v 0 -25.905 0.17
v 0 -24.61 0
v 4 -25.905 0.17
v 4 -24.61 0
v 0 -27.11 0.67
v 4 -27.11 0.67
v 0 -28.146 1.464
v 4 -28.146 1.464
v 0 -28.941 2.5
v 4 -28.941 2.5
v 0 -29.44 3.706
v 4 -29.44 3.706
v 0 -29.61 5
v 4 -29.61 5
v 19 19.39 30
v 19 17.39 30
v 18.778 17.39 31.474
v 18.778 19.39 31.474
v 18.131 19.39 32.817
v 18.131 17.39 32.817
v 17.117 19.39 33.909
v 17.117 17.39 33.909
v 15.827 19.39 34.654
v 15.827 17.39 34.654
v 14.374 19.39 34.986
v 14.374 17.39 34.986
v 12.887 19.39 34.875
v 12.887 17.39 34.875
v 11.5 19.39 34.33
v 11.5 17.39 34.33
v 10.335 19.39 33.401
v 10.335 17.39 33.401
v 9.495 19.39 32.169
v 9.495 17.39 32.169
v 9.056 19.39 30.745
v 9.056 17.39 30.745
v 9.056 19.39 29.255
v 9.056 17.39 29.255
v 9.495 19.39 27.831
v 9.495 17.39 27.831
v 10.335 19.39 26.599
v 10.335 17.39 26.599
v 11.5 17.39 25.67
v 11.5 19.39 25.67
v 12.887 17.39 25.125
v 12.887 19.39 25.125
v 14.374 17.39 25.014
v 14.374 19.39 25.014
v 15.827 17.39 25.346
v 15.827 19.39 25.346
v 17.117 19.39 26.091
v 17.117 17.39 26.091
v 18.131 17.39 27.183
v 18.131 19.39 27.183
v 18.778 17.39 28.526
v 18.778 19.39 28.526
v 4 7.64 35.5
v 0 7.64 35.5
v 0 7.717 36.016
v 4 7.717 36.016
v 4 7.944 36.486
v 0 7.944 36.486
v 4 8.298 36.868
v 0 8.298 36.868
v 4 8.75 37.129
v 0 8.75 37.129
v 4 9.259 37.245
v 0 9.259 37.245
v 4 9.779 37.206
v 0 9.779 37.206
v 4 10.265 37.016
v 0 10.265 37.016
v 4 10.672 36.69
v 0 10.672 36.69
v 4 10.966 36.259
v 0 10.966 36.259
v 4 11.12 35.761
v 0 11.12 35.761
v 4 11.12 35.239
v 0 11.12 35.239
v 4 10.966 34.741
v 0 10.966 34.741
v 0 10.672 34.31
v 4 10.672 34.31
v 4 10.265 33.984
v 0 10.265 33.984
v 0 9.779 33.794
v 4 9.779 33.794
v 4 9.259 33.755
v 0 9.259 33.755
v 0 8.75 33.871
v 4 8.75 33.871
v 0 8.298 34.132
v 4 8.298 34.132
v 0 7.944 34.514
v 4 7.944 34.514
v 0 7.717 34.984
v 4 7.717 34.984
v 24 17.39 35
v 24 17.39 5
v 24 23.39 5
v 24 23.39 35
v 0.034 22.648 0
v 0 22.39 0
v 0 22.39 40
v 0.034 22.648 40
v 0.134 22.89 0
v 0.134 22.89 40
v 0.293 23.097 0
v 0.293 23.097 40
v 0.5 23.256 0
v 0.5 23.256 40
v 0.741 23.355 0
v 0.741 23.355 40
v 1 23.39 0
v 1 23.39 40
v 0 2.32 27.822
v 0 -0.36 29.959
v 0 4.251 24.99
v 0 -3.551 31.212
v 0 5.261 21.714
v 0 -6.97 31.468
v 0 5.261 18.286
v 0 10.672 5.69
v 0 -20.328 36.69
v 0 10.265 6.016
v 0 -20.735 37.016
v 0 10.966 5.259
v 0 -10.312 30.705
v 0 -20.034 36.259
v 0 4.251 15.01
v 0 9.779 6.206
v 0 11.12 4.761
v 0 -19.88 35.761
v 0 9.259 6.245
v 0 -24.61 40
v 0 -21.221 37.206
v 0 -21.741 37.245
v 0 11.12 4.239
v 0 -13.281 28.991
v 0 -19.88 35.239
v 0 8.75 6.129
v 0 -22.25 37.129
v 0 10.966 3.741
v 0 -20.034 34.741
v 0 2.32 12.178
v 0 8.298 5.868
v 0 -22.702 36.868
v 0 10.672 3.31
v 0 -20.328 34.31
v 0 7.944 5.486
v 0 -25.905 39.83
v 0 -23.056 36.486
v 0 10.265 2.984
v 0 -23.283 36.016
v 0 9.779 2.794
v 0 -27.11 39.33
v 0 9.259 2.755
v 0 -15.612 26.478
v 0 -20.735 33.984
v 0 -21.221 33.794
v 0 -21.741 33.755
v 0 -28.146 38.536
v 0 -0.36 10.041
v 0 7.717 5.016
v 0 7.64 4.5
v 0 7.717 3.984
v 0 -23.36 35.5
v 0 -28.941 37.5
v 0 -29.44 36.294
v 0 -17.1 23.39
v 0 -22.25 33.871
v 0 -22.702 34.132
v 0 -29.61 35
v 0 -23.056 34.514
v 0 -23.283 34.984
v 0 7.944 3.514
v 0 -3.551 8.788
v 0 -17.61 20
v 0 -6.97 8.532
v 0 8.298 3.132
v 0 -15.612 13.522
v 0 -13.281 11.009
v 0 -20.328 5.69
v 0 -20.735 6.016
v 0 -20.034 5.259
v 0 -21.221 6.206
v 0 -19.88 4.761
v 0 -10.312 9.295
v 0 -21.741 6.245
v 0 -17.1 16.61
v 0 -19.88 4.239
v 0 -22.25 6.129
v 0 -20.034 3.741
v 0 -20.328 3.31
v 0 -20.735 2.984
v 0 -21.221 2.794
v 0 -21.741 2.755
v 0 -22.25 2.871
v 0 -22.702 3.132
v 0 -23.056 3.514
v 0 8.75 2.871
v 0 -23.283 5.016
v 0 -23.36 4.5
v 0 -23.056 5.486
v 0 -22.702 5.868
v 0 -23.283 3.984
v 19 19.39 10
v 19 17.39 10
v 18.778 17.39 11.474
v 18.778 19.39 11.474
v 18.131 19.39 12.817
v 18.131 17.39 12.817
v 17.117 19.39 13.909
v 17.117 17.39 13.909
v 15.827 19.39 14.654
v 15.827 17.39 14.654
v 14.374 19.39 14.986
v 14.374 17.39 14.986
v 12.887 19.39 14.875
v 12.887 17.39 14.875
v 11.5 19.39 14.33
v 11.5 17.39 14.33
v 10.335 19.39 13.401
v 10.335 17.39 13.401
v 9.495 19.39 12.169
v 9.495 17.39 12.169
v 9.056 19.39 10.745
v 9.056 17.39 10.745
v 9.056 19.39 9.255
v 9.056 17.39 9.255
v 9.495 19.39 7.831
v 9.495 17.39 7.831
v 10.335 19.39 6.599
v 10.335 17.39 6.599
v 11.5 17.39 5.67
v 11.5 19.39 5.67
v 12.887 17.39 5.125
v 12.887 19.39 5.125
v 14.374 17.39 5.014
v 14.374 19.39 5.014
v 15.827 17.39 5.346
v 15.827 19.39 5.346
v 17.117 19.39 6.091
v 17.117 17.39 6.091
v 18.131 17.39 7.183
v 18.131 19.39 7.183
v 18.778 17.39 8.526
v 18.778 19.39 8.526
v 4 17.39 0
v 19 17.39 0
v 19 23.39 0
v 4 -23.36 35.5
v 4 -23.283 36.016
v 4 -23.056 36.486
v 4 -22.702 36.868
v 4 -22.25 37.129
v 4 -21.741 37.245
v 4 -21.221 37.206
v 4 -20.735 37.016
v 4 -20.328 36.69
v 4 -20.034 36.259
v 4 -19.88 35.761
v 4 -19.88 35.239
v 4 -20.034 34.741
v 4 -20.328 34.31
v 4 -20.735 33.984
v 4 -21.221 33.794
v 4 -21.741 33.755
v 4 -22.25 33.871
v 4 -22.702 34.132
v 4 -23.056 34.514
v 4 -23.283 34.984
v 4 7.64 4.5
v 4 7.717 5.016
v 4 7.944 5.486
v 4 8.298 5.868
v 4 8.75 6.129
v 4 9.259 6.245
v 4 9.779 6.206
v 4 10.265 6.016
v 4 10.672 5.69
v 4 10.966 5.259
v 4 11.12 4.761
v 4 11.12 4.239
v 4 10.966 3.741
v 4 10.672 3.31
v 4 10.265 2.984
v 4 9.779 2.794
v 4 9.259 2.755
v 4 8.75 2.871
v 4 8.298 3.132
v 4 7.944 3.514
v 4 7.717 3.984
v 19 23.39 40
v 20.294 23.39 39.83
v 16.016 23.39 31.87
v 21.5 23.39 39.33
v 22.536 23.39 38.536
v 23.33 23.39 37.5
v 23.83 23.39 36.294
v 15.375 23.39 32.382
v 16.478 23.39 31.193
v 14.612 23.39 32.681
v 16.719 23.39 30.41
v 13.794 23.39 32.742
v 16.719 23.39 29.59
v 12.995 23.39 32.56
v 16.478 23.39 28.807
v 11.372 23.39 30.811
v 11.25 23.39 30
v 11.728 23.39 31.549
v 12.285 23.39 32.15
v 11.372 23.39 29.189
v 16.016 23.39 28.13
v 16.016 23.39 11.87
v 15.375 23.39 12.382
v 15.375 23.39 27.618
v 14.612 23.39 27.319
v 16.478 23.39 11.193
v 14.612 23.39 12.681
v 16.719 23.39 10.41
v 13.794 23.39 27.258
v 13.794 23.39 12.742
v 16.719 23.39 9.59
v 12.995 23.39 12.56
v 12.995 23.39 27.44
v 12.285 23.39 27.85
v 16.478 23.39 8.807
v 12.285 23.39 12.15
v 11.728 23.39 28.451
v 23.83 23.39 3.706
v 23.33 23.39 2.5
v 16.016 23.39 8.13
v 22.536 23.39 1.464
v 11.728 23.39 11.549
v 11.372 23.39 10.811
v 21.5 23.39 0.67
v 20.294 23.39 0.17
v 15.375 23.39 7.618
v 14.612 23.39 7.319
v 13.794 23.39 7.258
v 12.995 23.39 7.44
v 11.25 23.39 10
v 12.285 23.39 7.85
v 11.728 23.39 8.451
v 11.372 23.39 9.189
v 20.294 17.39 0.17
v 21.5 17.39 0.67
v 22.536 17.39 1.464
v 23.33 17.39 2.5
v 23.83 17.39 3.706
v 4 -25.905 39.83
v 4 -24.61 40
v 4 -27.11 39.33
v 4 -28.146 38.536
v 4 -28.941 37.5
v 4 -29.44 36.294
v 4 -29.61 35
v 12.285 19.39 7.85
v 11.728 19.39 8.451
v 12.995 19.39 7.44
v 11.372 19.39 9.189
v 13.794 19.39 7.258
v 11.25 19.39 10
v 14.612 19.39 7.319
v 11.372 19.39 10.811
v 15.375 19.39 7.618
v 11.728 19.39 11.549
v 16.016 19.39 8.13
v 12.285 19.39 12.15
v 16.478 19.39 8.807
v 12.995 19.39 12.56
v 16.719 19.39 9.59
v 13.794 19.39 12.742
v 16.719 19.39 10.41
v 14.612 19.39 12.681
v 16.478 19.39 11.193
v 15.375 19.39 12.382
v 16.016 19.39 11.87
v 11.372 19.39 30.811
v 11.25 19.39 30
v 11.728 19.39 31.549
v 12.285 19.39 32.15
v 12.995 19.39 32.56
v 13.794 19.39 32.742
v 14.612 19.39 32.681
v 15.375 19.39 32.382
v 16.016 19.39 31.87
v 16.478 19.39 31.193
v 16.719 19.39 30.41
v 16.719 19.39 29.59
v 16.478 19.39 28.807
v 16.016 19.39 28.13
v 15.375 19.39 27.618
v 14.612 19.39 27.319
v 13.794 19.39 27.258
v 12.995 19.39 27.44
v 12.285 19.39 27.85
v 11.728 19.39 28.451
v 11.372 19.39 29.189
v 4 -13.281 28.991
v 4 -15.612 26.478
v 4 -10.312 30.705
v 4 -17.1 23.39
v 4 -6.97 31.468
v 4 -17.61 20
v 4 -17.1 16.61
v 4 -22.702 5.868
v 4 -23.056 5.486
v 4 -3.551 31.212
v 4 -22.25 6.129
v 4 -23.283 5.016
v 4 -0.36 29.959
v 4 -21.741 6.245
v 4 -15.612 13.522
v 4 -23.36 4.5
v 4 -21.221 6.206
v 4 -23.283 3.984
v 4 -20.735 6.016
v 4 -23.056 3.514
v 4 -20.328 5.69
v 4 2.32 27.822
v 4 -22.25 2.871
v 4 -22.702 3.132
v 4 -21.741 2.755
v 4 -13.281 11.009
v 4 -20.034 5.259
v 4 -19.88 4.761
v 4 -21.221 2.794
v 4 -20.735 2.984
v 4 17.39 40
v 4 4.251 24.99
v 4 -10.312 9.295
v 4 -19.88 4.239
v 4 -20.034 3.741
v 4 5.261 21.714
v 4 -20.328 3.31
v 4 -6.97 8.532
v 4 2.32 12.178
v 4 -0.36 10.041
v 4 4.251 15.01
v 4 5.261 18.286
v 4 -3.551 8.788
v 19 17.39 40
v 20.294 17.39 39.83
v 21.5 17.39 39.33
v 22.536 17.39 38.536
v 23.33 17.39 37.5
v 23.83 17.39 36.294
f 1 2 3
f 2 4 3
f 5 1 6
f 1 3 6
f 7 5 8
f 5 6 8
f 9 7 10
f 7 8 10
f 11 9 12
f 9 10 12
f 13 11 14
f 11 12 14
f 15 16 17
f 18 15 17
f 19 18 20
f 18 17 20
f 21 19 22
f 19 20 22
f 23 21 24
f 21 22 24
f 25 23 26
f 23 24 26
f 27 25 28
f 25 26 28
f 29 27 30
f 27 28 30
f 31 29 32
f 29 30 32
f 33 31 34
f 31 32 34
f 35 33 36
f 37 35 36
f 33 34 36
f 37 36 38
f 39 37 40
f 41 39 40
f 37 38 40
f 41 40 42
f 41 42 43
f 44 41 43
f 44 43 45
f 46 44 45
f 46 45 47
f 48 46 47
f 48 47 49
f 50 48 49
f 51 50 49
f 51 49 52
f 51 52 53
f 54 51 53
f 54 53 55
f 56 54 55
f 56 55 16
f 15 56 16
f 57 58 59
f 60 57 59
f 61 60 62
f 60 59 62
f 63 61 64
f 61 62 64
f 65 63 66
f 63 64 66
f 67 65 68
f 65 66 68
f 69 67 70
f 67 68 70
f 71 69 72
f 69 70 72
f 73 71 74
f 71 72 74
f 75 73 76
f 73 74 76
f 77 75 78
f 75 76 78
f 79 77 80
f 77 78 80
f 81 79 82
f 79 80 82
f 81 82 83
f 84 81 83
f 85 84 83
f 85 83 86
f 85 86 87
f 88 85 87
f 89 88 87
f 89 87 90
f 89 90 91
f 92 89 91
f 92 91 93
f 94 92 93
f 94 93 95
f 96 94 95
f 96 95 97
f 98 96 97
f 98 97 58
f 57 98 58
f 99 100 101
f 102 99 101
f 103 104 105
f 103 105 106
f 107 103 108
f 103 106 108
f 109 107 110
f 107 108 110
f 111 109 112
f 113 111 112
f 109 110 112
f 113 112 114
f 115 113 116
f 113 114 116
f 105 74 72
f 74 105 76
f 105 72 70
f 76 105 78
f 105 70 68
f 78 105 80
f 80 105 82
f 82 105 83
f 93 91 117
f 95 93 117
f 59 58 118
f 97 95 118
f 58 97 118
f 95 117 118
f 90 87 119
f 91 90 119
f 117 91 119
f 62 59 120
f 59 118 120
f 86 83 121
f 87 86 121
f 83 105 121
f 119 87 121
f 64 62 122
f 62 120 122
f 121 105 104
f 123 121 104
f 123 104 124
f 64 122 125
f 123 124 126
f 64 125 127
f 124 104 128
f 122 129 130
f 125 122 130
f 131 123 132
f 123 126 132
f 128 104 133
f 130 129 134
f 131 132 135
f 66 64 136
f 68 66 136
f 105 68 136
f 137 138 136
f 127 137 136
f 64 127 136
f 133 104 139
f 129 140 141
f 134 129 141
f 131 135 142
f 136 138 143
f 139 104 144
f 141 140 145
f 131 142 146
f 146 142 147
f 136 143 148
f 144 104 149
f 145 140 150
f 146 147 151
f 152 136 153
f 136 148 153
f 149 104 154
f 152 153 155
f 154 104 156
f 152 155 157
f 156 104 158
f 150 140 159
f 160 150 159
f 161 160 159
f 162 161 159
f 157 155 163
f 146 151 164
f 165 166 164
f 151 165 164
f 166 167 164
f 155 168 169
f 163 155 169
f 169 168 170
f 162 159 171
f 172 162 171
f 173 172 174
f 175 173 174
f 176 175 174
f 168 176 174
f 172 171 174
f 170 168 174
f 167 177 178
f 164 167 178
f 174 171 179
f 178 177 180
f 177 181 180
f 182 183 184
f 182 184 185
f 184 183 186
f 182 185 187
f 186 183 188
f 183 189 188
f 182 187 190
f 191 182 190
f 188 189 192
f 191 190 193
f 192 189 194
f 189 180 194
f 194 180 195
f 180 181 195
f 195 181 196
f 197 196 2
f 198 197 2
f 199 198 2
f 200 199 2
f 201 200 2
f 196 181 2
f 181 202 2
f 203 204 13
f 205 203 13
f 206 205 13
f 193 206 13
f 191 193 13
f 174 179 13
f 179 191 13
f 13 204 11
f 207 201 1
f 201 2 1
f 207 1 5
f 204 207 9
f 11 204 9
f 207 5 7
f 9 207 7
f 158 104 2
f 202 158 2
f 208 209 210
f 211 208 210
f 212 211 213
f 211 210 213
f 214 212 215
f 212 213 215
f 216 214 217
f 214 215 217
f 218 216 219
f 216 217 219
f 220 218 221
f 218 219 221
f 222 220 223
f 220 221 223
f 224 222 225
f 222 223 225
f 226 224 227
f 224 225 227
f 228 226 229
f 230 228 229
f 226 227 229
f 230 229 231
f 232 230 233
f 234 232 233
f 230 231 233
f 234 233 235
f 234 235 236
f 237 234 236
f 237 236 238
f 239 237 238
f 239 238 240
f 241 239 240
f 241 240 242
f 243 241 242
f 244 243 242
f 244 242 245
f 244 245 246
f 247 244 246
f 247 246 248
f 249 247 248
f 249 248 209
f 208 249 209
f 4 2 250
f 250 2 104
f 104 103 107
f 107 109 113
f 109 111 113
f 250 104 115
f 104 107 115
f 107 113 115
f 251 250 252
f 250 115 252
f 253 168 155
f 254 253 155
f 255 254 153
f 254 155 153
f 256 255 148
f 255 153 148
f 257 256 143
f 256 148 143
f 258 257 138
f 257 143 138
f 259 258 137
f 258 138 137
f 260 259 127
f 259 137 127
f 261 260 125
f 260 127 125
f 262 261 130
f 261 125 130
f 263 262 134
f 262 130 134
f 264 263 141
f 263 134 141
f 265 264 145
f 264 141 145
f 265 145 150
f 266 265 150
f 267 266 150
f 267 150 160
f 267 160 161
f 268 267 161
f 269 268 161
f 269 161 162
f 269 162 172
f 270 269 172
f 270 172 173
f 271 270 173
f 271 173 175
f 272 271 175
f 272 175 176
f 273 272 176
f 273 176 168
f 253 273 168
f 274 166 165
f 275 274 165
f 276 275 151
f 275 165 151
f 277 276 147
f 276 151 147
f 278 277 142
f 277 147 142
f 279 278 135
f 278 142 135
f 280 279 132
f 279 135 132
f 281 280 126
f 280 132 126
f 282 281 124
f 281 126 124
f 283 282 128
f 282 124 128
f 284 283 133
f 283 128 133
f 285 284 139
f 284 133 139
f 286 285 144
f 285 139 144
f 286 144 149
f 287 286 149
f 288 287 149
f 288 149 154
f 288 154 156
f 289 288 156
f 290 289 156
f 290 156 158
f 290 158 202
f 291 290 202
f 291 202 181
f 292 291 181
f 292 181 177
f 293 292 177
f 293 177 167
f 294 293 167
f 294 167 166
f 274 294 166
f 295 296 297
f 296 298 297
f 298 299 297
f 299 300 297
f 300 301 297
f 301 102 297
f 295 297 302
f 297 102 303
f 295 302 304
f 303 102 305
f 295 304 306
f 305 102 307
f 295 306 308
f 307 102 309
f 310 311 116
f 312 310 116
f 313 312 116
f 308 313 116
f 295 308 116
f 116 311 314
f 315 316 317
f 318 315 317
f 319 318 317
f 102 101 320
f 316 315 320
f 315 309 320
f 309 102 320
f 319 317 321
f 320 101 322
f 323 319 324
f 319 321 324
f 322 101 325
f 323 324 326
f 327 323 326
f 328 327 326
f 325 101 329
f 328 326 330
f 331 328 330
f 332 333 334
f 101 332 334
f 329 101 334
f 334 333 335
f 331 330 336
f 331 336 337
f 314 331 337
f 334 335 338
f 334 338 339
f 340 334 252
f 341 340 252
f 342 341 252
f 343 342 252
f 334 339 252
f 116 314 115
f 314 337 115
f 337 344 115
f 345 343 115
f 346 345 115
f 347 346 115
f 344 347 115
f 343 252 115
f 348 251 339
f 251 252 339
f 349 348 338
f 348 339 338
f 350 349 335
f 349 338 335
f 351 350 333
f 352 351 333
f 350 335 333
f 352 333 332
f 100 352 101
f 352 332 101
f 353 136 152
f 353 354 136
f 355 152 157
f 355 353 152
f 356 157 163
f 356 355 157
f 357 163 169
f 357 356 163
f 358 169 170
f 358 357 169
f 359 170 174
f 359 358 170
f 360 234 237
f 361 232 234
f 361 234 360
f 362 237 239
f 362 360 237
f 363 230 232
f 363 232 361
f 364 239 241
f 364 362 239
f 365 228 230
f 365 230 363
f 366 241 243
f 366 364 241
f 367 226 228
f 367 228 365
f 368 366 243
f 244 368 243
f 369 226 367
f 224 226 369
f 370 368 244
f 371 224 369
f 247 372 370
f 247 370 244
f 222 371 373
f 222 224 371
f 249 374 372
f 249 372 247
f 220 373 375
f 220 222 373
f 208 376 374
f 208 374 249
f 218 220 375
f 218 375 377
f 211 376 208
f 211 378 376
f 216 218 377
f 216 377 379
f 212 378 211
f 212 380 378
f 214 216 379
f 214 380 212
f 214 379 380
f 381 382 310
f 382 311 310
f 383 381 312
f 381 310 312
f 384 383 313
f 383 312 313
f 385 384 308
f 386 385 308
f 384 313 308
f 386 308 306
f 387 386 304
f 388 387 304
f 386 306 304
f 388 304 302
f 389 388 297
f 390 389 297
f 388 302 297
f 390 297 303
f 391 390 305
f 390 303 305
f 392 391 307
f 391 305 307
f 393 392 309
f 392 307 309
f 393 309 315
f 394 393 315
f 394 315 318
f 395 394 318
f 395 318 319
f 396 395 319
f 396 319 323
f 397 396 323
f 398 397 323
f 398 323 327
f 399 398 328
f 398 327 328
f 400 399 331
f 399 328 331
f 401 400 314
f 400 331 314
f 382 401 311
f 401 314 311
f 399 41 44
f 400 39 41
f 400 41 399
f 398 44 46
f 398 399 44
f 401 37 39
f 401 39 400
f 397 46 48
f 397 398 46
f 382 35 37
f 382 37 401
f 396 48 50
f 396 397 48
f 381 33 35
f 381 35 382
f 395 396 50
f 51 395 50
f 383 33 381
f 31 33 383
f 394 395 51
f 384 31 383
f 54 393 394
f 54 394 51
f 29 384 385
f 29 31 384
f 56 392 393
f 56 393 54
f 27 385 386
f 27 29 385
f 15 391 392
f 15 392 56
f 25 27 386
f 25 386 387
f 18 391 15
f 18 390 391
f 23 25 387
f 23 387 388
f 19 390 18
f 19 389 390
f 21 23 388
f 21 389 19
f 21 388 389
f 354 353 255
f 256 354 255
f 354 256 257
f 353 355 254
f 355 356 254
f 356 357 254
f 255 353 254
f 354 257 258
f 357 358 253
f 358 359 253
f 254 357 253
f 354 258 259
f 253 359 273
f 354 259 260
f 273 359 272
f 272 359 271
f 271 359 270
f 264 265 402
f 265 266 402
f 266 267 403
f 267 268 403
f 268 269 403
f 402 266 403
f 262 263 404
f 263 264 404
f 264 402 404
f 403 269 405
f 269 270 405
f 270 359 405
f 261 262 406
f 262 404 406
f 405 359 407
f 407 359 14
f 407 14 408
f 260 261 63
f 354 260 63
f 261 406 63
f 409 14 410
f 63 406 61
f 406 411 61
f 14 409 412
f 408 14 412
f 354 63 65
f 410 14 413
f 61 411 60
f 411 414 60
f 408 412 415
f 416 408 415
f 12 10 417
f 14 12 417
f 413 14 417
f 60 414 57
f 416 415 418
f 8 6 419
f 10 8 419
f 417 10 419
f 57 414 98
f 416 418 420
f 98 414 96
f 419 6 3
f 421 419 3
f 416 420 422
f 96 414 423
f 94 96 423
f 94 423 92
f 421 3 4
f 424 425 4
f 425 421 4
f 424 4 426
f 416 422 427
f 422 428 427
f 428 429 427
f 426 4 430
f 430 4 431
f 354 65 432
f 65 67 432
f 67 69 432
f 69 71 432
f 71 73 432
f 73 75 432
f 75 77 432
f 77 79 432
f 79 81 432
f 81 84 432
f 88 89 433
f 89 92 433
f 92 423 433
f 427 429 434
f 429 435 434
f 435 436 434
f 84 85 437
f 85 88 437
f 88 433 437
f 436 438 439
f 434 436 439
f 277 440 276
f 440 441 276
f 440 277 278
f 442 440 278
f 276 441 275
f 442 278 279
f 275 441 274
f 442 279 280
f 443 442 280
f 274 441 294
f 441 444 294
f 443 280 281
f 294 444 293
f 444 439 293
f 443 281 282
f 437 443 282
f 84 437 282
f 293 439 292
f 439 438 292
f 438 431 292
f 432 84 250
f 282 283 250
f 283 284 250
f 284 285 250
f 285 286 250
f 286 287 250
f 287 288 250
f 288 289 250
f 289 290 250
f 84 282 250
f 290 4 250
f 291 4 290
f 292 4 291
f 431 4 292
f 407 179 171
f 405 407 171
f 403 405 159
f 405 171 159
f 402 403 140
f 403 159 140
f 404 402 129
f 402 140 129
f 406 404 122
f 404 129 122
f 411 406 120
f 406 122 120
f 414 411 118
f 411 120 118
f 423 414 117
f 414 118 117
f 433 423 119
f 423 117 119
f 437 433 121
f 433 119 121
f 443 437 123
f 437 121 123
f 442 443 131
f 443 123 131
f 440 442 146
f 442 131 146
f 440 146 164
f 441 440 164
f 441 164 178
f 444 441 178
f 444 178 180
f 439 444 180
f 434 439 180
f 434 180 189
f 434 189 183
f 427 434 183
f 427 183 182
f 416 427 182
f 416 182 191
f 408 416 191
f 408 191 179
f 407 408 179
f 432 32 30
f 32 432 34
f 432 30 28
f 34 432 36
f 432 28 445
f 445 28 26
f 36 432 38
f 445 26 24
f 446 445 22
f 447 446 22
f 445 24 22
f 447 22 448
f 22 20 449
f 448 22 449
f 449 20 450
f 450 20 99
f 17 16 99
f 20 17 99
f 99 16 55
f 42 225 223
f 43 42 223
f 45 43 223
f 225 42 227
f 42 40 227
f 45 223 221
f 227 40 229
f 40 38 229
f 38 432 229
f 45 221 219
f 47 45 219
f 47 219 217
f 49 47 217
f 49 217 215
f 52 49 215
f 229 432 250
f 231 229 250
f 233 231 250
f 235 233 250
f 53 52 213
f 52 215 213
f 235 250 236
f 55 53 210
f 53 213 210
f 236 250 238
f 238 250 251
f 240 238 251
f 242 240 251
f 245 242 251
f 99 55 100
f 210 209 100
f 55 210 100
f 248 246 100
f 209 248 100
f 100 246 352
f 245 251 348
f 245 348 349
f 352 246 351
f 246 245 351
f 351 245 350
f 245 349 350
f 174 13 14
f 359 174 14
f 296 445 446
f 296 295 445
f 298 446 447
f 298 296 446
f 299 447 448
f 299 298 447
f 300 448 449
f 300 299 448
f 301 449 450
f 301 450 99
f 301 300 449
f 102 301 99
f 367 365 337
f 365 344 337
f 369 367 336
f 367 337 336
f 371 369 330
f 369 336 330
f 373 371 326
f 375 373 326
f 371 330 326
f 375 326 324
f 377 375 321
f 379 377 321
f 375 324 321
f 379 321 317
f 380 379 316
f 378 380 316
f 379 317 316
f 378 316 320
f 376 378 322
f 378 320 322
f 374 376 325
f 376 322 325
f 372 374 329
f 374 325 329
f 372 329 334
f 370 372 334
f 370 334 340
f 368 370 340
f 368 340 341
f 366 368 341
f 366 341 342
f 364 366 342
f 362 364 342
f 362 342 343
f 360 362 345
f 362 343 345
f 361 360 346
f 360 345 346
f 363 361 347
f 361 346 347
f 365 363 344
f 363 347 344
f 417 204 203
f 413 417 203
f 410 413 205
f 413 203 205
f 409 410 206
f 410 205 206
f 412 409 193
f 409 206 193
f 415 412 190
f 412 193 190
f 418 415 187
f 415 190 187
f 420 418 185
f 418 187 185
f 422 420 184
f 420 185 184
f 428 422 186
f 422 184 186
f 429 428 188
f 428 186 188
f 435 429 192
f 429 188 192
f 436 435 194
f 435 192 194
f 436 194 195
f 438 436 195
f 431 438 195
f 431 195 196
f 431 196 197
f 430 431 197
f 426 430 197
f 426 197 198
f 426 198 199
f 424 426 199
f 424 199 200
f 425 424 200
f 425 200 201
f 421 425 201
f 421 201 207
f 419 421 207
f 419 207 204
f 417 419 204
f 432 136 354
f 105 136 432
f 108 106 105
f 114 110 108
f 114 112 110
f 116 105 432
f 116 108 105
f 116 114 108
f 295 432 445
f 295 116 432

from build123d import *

# Parameters (mm, degrees)
F5_DEPTH       = 40
F1_D           = 3.5
F7_D           = 23
F2_D           = 5.5
F2_CBORE_D     = 10
F2_CBORE_DEPTH = 2
F3_R           = 5
F4_R           = 1


with BuildPart() as f5:
    # F0 (on Top) → F5 (new body)
    with BuildSketch(Plane.XY):
        Polygon((0, 23.38951), (0, -29.61049), (4, -29.61049), (4, 17.38951), (24, 17.38951), (24, 23.38951), align=None)
    extrude(amount=F5_DEPTH)

    # F1 (through all)
    with Locations(Plane.YZ.offset(4)):
        with Locations((-21.61049, 35.5), (9.38951, 35.5), (-21.61049, 4.5), (9.38951, 4.5)):
            Hole(F1_D / 2)

    # F7 (through all)
    with Locations(Plane.YZ.offset(4)):
        with Locations((-6.11049, 20)):
            Hole(F7_D / 2)

    # F2 (through all)
    with Locations(Plane.XZ.offset(-17.38951)):
        with Locations((14, 30), (14, 10)):
            CounterBoreHole(F2_D / 2, F2_CBORE_D / 2, F2_CBORE_DEPTH)

    # F3
    f3_edges = [f5.edges().sort_by_distance(p)[0] for p in [
        (2, -29.61049, 40),
        (2, -29.61049, 0),
        (24, 20.38951, 40),
        (24, 20.38951, 0),
    ]]
    fillet(f3_edges, radius=F3_R)

    # F4
    f4_edges = [f5.edges().sort_by_distance(p)[0] for p in [
        (0, 23.38951, 20),
    ]]
    fillet(f4_edges, radius=F4_R)


solid = f5.part
